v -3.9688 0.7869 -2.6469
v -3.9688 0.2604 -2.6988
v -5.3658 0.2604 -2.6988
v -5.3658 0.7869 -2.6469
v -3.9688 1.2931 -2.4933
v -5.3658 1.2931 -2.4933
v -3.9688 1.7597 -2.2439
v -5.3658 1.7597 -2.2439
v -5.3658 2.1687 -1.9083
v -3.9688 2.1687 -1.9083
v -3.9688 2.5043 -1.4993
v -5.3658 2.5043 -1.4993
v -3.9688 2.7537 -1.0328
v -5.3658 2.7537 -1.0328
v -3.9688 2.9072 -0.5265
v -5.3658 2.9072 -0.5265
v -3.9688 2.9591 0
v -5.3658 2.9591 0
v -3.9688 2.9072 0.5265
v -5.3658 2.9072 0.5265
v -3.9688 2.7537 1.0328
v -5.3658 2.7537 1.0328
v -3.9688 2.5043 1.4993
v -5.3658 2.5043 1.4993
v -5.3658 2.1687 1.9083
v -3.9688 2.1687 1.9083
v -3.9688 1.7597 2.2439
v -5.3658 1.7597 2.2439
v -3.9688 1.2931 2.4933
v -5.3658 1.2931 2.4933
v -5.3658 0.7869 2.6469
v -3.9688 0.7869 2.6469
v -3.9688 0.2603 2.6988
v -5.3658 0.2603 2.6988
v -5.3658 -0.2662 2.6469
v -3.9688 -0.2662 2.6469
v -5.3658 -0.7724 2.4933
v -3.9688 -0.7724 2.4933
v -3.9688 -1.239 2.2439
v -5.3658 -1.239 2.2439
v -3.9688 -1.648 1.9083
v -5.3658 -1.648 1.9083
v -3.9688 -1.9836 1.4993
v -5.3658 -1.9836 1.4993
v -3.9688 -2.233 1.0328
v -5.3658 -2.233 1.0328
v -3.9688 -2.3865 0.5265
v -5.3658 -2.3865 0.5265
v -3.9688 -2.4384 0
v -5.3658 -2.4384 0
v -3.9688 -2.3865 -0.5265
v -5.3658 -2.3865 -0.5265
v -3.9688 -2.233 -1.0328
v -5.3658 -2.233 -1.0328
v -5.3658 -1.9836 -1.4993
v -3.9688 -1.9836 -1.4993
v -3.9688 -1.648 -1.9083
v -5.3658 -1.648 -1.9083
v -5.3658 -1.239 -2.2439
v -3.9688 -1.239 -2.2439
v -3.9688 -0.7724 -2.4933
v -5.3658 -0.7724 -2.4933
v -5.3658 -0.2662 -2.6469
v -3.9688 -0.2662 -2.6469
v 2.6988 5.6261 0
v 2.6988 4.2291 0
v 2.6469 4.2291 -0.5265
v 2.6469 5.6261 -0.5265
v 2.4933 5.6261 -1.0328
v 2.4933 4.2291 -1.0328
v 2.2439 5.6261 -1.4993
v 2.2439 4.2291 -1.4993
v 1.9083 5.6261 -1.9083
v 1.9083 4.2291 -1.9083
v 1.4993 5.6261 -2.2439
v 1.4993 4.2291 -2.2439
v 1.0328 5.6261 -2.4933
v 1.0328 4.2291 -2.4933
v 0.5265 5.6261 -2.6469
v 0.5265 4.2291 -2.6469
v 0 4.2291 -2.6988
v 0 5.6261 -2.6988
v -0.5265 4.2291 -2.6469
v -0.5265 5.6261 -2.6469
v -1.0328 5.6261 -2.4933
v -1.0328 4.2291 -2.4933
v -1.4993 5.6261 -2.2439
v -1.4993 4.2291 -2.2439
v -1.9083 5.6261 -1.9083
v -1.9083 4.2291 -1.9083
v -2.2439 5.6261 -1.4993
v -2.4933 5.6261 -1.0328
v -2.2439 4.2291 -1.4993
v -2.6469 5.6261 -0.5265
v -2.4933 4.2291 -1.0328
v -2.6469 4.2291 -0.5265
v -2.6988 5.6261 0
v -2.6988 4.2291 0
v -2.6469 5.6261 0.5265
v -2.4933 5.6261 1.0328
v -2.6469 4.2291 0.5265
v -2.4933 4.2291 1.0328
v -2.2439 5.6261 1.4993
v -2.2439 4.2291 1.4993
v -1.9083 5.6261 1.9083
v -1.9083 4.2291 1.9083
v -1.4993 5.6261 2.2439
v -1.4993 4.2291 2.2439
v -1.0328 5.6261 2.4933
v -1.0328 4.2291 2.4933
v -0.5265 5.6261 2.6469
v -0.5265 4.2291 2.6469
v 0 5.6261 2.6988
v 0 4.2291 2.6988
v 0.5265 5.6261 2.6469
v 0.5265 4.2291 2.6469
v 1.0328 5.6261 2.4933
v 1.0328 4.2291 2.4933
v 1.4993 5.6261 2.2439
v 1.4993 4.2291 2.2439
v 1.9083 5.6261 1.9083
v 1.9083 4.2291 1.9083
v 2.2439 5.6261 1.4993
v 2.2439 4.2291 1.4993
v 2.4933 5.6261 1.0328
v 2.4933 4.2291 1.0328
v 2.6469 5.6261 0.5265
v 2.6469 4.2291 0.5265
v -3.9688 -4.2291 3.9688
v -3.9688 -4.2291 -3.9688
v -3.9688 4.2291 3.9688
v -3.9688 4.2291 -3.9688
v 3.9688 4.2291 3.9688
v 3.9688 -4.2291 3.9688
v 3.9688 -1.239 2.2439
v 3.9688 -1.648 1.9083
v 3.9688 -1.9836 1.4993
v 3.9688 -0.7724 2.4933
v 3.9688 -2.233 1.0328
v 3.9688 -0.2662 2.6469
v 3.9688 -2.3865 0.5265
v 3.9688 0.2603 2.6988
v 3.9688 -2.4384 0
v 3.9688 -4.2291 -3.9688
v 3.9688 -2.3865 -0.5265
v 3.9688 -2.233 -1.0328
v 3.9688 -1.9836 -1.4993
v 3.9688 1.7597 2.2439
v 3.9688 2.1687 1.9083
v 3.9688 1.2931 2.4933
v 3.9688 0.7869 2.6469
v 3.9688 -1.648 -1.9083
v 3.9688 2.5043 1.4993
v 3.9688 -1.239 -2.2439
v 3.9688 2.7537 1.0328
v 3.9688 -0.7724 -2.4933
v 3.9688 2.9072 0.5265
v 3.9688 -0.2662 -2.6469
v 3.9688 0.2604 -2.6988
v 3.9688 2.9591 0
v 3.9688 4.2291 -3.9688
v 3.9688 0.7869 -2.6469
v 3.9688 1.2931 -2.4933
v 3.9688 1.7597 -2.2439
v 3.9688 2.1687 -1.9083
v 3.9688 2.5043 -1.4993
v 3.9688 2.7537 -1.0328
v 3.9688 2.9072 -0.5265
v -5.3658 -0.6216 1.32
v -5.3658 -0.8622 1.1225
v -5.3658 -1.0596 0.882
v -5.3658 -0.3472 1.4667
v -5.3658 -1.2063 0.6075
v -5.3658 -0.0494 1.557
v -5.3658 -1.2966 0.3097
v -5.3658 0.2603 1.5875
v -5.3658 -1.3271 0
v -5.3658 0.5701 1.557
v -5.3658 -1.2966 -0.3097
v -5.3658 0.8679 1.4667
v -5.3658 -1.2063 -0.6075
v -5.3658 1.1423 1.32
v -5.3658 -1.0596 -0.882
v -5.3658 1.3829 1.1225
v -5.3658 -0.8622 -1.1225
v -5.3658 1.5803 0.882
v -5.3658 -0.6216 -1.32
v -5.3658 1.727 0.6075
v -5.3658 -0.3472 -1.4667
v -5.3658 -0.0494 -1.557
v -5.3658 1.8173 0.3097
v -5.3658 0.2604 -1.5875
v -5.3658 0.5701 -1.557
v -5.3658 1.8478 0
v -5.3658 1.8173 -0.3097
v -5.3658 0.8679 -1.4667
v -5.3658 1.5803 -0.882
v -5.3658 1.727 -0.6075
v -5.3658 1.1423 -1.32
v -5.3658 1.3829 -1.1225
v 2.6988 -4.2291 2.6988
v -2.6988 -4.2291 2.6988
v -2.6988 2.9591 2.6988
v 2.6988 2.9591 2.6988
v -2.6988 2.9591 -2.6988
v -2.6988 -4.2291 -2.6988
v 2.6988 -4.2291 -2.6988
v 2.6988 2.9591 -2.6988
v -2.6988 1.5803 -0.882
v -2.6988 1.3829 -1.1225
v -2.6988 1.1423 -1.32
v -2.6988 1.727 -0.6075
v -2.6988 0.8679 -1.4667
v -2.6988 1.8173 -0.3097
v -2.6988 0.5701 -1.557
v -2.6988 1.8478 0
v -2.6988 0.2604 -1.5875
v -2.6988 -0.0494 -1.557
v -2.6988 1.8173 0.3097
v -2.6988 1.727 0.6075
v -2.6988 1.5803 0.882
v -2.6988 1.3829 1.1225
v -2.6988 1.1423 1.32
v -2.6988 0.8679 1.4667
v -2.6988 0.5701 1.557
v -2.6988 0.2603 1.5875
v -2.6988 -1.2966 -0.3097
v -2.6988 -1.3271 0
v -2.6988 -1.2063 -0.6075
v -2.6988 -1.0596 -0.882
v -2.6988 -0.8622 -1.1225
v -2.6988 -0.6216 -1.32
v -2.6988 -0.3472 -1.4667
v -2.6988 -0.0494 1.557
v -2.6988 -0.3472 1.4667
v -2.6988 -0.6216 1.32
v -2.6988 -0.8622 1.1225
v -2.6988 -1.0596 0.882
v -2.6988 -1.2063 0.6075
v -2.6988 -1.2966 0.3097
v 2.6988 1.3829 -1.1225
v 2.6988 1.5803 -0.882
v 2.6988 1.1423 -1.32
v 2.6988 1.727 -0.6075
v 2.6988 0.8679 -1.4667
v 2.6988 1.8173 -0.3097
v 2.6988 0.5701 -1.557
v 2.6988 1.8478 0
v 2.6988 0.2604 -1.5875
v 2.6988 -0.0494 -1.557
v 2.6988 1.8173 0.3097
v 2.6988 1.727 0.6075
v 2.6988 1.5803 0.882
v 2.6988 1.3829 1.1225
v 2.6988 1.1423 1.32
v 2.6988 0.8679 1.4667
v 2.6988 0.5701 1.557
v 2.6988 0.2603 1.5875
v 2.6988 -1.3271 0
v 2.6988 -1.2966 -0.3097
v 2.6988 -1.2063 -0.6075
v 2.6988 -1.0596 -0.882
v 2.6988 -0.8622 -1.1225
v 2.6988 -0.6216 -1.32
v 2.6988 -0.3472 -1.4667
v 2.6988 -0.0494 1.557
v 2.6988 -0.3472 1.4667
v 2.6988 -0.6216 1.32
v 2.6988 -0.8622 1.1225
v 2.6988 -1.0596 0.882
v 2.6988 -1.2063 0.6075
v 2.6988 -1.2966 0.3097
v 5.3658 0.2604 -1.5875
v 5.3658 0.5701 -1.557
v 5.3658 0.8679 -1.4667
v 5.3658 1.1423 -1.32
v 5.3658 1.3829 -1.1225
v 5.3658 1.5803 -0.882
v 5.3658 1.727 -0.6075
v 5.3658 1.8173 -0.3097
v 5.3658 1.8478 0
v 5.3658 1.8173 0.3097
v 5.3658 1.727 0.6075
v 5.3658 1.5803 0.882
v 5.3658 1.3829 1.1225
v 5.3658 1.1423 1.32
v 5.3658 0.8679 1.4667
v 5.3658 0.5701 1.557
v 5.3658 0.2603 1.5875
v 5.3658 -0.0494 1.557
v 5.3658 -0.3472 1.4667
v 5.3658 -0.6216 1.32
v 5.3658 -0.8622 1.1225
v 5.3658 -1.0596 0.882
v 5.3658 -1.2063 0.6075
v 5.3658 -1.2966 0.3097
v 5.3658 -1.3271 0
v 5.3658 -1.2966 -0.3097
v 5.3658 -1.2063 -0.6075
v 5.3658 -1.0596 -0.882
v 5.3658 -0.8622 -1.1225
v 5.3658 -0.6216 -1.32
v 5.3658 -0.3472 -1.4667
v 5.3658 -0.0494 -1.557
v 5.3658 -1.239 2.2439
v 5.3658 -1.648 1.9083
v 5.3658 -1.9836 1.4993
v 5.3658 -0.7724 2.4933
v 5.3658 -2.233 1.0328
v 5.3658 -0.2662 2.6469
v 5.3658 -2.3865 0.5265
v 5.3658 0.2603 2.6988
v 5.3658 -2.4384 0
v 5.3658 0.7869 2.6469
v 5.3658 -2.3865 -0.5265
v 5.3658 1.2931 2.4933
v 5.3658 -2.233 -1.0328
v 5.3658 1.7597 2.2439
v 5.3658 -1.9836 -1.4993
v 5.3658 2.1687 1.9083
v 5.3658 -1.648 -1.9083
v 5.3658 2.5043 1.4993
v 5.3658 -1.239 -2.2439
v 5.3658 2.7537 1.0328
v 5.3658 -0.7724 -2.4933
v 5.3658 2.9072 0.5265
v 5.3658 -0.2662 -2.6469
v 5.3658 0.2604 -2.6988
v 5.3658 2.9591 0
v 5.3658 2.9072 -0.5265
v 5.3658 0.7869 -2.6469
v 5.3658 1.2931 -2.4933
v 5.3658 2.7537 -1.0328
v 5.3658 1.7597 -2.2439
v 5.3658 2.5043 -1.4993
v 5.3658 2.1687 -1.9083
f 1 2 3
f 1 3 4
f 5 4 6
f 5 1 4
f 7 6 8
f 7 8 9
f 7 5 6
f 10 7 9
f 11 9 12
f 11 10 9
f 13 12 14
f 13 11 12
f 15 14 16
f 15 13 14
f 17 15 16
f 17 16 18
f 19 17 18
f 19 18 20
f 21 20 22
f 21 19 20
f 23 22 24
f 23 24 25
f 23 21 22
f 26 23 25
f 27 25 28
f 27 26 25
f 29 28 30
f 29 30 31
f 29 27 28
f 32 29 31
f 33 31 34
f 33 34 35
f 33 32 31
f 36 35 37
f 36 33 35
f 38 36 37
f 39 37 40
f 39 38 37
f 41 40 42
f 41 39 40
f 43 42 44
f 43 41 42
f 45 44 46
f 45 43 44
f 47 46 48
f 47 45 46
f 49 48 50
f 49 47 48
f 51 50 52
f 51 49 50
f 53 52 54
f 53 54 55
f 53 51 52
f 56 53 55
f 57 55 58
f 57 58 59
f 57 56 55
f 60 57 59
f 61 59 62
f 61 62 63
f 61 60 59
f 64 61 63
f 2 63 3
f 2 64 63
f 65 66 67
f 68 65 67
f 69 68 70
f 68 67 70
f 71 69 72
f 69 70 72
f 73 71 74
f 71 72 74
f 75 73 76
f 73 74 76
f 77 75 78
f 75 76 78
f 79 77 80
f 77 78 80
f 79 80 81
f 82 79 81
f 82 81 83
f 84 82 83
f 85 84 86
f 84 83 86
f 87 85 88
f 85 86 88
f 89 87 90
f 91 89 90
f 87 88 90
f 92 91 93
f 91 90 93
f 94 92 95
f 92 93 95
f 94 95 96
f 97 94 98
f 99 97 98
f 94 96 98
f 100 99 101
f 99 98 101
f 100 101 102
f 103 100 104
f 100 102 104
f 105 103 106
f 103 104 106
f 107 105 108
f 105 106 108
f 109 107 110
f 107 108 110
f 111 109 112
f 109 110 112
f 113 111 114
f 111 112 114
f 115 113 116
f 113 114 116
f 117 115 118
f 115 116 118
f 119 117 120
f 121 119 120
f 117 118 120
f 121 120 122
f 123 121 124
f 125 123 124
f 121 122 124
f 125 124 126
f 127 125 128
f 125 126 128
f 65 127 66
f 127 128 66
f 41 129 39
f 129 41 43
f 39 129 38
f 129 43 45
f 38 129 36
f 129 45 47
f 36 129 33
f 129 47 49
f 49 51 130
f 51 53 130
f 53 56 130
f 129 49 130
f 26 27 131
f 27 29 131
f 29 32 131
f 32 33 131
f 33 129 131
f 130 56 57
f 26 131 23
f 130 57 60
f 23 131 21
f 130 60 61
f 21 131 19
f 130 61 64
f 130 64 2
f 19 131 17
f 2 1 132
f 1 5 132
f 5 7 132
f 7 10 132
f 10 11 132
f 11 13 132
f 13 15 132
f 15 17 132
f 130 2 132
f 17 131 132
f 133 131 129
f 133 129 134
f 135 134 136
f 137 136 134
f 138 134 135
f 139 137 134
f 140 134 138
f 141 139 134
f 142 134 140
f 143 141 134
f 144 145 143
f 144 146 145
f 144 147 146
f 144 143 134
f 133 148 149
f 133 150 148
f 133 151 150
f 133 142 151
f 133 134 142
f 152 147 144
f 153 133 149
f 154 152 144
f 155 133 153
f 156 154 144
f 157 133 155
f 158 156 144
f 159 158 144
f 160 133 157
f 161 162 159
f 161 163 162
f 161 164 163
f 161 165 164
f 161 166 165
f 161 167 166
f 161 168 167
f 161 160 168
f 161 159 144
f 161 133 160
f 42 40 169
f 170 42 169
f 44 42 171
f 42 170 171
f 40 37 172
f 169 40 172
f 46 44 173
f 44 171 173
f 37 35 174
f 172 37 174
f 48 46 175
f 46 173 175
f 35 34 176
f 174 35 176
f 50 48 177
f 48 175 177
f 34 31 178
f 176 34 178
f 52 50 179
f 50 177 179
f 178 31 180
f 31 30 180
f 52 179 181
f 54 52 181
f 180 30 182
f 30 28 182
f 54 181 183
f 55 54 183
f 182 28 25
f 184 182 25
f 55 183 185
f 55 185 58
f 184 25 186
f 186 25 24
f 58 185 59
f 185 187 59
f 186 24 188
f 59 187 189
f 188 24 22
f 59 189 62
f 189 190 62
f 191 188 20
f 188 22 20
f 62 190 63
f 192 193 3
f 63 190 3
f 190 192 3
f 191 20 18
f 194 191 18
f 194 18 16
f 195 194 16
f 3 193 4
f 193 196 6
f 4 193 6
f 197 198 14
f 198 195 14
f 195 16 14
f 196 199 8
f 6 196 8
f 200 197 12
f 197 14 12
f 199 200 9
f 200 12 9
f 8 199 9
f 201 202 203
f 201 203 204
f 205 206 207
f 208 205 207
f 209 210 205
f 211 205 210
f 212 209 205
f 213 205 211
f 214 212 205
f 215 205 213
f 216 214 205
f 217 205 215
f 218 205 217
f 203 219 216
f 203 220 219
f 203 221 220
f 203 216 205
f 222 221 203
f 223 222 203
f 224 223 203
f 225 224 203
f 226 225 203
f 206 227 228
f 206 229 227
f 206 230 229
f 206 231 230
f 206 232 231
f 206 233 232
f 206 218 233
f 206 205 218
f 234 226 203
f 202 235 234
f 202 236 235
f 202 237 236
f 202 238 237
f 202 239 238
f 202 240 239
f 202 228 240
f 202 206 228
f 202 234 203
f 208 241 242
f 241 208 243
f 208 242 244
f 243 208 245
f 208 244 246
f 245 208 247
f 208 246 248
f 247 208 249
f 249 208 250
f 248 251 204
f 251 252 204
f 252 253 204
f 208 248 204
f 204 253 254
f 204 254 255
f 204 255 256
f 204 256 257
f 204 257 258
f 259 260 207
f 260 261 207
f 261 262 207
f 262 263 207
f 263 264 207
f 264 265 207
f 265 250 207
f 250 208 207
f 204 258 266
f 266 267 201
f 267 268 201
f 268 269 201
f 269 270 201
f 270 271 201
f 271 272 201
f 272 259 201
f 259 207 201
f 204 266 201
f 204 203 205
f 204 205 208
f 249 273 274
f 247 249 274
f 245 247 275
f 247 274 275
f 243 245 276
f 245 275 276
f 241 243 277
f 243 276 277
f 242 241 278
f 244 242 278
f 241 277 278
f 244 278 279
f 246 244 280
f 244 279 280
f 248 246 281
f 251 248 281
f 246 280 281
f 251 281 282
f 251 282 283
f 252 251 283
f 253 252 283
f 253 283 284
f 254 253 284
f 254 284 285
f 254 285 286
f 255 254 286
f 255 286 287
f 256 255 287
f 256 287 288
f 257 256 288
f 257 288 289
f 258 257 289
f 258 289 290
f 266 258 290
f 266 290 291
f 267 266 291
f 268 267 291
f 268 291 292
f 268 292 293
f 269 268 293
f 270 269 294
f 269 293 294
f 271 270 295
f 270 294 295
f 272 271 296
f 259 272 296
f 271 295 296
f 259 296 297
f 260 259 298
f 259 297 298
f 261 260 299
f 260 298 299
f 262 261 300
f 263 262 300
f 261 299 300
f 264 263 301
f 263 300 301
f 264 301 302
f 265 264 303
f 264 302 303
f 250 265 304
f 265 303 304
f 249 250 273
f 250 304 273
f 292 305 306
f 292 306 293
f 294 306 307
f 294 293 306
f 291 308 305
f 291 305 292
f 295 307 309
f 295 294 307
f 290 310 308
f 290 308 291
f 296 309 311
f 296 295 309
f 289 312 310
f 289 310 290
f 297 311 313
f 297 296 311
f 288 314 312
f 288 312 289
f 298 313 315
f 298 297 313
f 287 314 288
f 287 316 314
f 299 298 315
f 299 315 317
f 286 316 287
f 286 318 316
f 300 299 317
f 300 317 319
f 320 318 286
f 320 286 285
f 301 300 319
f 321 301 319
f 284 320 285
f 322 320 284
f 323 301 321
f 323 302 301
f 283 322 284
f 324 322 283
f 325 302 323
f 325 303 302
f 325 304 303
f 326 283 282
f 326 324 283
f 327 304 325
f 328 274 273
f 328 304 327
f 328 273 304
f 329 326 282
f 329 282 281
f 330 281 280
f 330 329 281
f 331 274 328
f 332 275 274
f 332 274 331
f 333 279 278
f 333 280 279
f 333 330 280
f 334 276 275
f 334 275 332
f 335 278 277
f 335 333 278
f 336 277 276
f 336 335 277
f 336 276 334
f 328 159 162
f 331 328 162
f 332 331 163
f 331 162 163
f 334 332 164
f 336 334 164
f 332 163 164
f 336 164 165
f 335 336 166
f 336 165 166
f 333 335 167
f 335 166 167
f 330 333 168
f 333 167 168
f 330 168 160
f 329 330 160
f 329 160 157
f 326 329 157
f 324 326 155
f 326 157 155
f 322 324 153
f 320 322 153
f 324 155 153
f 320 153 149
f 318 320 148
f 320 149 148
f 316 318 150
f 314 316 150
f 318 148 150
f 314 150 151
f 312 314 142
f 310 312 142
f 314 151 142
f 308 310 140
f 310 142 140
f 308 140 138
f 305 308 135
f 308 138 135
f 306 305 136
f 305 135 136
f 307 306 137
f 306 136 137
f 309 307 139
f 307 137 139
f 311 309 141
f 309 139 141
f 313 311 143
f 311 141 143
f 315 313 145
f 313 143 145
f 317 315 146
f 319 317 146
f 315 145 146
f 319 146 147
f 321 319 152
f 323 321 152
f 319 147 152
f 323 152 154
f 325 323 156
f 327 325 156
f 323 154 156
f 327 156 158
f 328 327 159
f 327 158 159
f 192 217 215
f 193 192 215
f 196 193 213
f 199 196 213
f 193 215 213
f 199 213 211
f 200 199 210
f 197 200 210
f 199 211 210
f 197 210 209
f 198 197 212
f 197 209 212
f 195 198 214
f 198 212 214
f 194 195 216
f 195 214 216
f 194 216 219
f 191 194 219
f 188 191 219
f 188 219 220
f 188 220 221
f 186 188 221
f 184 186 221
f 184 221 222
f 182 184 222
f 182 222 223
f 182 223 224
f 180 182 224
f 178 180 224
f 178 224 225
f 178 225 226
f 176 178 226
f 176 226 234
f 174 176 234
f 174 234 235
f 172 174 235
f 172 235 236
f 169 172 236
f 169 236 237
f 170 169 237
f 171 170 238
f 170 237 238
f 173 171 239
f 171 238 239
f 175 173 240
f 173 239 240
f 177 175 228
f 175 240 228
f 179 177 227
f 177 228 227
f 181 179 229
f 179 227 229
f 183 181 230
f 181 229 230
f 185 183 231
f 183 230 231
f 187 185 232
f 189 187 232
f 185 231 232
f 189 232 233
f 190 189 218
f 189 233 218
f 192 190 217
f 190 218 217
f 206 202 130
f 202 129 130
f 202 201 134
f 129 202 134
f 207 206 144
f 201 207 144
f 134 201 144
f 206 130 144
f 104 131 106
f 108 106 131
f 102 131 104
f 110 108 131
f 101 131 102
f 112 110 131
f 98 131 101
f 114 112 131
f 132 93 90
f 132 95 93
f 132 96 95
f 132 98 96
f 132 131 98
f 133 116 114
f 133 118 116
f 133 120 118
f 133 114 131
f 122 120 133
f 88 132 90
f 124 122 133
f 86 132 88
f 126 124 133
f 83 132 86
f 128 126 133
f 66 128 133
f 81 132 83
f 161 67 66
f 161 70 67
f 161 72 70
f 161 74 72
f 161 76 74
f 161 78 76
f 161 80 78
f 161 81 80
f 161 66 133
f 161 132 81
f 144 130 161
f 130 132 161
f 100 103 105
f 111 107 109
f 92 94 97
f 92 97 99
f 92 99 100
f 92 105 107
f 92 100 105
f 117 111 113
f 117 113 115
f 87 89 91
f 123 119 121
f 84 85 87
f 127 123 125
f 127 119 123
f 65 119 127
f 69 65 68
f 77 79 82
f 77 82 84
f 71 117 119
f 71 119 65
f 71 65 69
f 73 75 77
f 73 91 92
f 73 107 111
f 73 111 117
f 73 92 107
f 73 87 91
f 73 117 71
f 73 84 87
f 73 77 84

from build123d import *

# Parameters (mm, degrees)
SKETCH1_W           = 7.9375
SKETCH1_H           = 7.9375
BOSS_EXTRUDE1_DEPTH = 4.2291
SKETCH2_W           = 5.3975
SKETCH2_H           = 5.3975
CUT_EXTRUDE1_DEPTH  = 7.1882
SKETCH3_R           = 2.69875
BOSS_EXTRUDE2_DEPTH = 1.397
SKETCH5_R           = 2.69875
BOSS_EXTRUDE4_DEPTH = 1.397
SKETCH6_R           = 1.5875
CUT_EXTRUDE2_DEPTH  = 11.7315


with BuildPart() as part:
    # Sketch1 → Boss-Extrude1 (new body, symmetric)
    with BuildSketch(Plane(origin=(0, 0, 0), x_dir=(1, 0, 0), z_dir=(0, 1, 0))):
        Rectangle(SKETCH1_W, SKETCH1_H)
    extrude(amount=BOSS_EXTRUDE1_DEPTH, both=True)

    # Sketch2 → Cut-Extrude1 (cut)
    with BuildSketch(Plane.XZ.offset(4.2291)):
        Rectangle(SKETCH2_W, SKETCH2_H)
    extrude(amount=-CUT_EXTRUDE1_DEPTH, mode=Mode.SUBTRACT)

    # Sketch3 → Boss-Extrude2 (add)
    with BuildSketch(Plane(origin=(0, 4.2291, 0), x_dir=(1, 0, 0), z_dir=(0, 1, 0))):
        Circle(SKETCH3_R)
    extrude(amount=BOSS_EXTRUDE2_DEPTH)

    # Sketch5 → Boss-Extrude4 (add)
    with BuildSketch(Plane(origin=(3.96875, 0, 0), x_dir=(0, 0, -1), z_dir=(1, 0, 0))):
        with Locations((0, 0.26035)):
            Circle(SKETCH5_R)
    boss_extrude4 = extrude(amount=BOSS_EXTRUDE4_DEPTH)

    # Mirror1: Boss-Extrude4 across plane
    add(boss_extrude4.mirror(Plane(origin=(0, 0, 0), x_dir=(0, 0, 1), z_dir=(1, 0, 0))))

    # Sketch6 → Cut-Extrude2 (cut, through all)
    with BuildSketch(Plane(origin=(5.36575, 0, 0), x_dir=(0, 0, -1), z_dir=(1, 0, 0))):
        with Locations((0, 0.26035)):
            Circle(SKETCH6_R)
    extrude(amount=-CUT_EXTRUDE2_DEPTH, mode=Mode.SUBTRACT)


solid = part.part
